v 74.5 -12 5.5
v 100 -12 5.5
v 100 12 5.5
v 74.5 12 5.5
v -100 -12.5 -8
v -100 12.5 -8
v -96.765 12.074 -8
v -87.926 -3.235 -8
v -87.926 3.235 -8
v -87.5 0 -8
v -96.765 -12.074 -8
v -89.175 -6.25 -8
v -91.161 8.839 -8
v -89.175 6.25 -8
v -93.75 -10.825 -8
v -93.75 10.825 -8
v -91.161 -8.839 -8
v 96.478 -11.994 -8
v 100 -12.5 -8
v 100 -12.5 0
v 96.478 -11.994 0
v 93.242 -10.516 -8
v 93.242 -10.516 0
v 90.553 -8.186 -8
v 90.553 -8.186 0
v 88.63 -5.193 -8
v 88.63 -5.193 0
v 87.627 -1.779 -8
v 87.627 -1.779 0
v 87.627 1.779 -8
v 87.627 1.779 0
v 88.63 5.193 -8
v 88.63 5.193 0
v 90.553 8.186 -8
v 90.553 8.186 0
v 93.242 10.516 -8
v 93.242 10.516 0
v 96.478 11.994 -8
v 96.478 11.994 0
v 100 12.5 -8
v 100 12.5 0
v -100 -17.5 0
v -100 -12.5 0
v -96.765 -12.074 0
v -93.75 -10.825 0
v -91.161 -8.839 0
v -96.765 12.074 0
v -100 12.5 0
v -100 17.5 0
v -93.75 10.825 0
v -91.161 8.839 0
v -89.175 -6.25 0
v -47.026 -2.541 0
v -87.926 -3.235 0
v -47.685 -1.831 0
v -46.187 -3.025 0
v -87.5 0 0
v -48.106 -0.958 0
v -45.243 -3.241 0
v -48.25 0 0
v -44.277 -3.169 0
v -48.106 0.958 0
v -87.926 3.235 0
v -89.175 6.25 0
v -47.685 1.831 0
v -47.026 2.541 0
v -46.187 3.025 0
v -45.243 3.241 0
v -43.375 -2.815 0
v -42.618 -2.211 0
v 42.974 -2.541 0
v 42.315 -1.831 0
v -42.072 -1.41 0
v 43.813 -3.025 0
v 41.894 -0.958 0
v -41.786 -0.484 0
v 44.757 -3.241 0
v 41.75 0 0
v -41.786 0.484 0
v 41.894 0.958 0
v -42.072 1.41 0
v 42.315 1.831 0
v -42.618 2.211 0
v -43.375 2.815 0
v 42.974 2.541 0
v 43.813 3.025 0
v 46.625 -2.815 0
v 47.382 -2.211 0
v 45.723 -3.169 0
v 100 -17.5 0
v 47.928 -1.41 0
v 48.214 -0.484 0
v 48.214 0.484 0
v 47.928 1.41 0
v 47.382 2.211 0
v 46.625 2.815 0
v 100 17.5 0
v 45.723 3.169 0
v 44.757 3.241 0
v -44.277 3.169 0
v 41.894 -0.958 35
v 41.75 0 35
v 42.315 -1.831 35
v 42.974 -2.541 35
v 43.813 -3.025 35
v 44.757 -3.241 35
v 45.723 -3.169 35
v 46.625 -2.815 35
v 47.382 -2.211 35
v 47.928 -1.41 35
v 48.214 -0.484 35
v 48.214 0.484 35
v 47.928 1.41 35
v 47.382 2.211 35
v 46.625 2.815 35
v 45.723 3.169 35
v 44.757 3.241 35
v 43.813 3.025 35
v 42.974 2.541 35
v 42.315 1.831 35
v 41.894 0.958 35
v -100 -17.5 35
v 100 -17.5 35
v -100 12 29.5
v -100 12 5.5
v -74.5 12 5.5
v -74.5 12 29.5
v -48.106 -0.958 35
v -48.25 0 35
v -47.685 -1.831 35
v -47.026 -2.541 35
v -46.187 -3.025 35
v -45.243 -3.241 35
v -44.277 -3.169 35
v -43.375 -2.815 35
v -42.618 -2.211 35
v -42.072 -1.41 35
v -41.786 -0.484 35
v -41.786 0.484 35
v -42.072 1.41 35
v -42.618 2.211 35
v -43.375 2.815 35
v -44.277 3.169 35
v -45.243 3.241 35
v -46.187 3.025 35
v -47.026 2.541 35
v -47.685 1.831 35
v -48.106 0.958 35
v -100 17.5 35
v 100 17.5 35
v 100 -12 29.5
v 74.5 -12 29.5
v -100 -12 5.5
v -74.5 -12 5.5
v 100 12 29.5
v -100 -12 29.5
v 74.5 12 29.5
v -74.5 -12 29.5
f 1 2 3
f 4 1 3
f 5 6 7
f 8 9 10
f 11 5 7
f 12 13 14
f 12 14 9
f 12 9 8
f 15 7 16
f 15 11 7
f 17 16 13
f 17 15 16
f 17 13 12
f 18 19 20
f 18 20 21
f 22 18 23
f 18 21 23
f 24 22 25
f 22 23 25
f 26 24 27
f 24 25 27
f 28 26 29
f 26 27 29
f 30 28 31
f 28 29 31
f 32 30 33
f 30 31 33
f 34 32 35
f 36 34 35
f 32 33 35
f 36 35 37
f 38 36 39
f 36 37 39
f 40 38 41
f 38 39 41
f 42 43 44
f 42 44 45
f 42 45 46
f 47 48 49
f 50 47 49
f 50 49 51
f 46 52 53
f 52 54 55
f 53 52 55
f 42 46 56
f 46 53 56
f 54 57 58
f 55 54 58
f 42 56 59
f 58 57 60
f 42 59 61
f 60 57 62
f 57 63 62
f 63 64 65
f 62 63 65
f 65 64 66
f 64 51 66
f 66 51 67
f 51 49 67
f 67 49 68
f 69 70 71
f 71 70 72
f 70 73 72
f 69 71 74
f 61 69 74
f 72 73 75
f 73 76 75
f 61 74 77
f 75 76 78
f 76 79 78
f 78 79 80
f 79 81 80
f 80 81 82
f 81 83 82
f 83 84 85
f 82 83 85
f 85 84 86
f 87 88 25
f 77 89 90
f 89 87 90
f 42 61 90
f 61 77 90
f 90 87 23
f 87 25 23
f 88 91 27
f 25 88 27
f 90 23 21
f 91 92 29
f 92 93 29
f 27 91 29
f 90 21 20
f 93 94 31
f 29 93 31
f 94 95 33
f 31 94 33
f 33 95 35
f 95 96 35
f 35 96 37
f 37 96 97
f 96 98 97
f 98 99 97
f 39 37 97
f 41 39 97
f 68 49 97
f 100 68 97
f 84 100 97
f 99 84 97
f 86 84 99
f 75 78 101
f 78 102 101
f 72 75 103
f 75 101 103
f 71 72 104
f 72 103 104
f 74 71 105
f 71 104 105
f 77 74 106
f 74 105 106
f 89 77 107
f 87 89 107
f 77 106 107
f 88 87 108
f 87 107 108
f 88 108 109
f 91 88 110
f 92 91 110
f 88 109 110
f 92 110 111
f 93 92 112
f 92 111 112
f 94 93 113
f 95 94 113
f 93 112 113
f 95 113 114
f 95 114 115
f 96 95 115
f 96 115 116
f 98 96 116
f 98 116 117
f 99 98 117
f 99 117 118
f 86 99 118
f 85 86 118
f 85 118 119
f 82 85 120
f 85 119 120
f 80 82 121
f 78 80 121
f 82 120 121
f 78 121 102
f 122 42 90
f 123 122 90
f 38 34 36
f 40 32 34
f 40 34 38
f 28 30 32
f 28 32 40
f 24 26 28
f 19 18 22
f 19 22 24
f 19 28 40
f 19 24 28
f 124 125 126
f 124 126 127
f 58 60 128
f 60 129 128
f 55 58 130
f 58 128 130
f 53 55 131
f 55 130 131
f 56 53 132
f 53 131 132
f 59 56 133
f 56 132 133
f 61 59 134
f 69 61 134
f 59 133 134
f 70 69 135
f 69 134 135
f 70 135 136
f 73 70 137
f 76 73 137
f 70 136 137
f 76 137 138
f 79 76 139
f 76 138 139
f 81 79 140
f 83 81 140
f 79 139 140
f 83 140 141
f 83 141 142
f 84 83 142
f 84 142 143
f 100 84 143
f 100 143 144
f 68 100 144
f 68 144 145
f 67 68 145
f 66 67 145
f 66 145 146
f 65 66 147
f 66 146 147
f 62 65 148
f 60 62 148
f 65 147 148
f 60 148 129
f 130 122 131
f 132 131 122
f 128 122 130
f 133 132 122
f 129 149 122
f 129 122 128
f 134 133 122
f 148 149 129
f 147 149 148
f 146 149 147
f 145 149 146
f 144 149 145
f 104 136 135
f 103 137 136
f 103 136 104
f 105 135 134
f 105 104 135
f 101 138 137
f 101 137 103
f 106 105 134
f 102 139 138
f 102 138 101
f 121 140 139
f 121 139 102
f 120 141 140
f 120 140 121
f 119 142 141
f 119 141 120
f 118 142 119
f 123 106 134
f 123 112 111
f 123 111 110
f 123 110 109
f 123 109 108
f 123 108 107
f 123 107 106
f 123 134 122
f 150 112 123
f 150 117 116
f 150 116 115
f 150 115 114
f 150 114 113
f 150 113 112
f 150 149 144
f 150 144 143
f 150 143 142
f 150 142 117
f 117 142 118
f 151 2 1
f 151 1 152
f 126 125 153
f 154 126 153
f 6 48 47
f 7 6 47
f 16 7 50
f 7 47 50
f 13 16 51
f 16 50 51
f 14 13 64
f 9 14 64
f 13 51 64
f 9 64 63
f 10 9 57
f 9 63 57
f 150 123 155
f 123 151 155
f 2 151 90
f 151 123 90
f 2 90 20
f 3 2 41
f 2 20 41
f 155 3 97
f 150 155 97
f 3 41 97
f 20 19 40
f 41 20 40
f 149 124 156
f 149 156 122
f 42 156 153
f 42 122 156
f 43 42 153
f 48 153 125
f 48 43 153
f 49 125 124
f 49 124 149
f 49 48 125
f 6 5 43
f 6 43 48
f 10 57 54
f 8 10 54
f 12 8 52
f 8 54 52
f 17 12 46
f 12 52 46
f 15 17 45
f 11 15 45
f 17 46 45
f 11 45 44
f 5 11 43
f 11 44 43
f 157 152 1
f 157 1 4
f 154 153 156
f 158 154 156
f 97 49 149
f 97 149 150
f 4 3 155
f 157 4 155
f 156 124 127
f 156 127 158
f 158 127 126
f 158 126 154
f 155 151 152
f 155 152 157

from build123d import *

# Parameters (mm, degrees)
F0_W     = 200
F0_H     = 35
F1_DEPTH = 35
F2_W     = 24
F2_H     = 24
F3_DEPTH = 25.5
F4_W     = 24
F4_H     = 24
F5_DEPTH = 25.5
F7_D     = 6.5
F7_DEPTH = 35
F7_TIP   = 1.9527970118
F9_DEPTH = 8


with BuildPart() as f1:
    # F0 (on Top) → F1 (new body)
    with BuildSketch(Plane.XY):
        Rectangle(F0_W, F0_H)
    extrude(amount=F1_DEPTH)

    # F2 (on face) → F3 (cut)
    with BuildSketch(Plane.YZ.offset(100)):
        with Locations((0, 17.5)):
            Rectangle(F2_W, F2_H)
    extrude(amount=-F3_DEPTH, mode=Mode.SUBTRACT)

    # F4 (on face) → F5 (cut)
    with BuildSketch(Plane(origin=(-100, 0, 0), x_dir=(0, -1, 0), z_dir=(-1, 0, 0))):
        with Locations((0, 17.5)):
            Rectangle(F4_W, F4_H)
    extrude(amount=-F5_DEPTH, mode=Mode.SUBTRACT)

    # F7
    with Locations(Plane(origin=(0, 0, 0), x_dir=(1, 0, 0), z_dir=(0, 0, -1))):
        with Locations((-45, 0), (45, 0)):
            Hole(F7_D / 2, depth=F7_DEPTH)
            with Locations((0, 0, -(F7_DEPTH + F7_TIP / 2))):  # 118° drill point
                Cone(0, F7_D / 2, F7_TIP, mode=Mode.SUBTRACT)

    # F8 (on face) → F9 (join)
    with BuildSketch(Plane(origin=(0, 0, 0), x_dir=(1, 0, 0), z_dir=(0, 0, -1))):
        with BuildLine():
            Line((100, -12.5), (100, 12.5))
            ThreePointArc((100, 12.5), (87.5, 0), (100, -12.5))
        make_face()
        with BuildLine():
            ThreePointArc((-87.5, 0), (-91.1611652352, 8.8388347648), (-100, 12.5))
            Line((-100, 12.5), (-100, -12.5))
            ThreePointArc((-100, -12.5), (-91.1611652352, -8.8388347648), (-87.5, 0))
        make_face()
    extrude(amount=F9_DEPTH)


solid = f1.part
